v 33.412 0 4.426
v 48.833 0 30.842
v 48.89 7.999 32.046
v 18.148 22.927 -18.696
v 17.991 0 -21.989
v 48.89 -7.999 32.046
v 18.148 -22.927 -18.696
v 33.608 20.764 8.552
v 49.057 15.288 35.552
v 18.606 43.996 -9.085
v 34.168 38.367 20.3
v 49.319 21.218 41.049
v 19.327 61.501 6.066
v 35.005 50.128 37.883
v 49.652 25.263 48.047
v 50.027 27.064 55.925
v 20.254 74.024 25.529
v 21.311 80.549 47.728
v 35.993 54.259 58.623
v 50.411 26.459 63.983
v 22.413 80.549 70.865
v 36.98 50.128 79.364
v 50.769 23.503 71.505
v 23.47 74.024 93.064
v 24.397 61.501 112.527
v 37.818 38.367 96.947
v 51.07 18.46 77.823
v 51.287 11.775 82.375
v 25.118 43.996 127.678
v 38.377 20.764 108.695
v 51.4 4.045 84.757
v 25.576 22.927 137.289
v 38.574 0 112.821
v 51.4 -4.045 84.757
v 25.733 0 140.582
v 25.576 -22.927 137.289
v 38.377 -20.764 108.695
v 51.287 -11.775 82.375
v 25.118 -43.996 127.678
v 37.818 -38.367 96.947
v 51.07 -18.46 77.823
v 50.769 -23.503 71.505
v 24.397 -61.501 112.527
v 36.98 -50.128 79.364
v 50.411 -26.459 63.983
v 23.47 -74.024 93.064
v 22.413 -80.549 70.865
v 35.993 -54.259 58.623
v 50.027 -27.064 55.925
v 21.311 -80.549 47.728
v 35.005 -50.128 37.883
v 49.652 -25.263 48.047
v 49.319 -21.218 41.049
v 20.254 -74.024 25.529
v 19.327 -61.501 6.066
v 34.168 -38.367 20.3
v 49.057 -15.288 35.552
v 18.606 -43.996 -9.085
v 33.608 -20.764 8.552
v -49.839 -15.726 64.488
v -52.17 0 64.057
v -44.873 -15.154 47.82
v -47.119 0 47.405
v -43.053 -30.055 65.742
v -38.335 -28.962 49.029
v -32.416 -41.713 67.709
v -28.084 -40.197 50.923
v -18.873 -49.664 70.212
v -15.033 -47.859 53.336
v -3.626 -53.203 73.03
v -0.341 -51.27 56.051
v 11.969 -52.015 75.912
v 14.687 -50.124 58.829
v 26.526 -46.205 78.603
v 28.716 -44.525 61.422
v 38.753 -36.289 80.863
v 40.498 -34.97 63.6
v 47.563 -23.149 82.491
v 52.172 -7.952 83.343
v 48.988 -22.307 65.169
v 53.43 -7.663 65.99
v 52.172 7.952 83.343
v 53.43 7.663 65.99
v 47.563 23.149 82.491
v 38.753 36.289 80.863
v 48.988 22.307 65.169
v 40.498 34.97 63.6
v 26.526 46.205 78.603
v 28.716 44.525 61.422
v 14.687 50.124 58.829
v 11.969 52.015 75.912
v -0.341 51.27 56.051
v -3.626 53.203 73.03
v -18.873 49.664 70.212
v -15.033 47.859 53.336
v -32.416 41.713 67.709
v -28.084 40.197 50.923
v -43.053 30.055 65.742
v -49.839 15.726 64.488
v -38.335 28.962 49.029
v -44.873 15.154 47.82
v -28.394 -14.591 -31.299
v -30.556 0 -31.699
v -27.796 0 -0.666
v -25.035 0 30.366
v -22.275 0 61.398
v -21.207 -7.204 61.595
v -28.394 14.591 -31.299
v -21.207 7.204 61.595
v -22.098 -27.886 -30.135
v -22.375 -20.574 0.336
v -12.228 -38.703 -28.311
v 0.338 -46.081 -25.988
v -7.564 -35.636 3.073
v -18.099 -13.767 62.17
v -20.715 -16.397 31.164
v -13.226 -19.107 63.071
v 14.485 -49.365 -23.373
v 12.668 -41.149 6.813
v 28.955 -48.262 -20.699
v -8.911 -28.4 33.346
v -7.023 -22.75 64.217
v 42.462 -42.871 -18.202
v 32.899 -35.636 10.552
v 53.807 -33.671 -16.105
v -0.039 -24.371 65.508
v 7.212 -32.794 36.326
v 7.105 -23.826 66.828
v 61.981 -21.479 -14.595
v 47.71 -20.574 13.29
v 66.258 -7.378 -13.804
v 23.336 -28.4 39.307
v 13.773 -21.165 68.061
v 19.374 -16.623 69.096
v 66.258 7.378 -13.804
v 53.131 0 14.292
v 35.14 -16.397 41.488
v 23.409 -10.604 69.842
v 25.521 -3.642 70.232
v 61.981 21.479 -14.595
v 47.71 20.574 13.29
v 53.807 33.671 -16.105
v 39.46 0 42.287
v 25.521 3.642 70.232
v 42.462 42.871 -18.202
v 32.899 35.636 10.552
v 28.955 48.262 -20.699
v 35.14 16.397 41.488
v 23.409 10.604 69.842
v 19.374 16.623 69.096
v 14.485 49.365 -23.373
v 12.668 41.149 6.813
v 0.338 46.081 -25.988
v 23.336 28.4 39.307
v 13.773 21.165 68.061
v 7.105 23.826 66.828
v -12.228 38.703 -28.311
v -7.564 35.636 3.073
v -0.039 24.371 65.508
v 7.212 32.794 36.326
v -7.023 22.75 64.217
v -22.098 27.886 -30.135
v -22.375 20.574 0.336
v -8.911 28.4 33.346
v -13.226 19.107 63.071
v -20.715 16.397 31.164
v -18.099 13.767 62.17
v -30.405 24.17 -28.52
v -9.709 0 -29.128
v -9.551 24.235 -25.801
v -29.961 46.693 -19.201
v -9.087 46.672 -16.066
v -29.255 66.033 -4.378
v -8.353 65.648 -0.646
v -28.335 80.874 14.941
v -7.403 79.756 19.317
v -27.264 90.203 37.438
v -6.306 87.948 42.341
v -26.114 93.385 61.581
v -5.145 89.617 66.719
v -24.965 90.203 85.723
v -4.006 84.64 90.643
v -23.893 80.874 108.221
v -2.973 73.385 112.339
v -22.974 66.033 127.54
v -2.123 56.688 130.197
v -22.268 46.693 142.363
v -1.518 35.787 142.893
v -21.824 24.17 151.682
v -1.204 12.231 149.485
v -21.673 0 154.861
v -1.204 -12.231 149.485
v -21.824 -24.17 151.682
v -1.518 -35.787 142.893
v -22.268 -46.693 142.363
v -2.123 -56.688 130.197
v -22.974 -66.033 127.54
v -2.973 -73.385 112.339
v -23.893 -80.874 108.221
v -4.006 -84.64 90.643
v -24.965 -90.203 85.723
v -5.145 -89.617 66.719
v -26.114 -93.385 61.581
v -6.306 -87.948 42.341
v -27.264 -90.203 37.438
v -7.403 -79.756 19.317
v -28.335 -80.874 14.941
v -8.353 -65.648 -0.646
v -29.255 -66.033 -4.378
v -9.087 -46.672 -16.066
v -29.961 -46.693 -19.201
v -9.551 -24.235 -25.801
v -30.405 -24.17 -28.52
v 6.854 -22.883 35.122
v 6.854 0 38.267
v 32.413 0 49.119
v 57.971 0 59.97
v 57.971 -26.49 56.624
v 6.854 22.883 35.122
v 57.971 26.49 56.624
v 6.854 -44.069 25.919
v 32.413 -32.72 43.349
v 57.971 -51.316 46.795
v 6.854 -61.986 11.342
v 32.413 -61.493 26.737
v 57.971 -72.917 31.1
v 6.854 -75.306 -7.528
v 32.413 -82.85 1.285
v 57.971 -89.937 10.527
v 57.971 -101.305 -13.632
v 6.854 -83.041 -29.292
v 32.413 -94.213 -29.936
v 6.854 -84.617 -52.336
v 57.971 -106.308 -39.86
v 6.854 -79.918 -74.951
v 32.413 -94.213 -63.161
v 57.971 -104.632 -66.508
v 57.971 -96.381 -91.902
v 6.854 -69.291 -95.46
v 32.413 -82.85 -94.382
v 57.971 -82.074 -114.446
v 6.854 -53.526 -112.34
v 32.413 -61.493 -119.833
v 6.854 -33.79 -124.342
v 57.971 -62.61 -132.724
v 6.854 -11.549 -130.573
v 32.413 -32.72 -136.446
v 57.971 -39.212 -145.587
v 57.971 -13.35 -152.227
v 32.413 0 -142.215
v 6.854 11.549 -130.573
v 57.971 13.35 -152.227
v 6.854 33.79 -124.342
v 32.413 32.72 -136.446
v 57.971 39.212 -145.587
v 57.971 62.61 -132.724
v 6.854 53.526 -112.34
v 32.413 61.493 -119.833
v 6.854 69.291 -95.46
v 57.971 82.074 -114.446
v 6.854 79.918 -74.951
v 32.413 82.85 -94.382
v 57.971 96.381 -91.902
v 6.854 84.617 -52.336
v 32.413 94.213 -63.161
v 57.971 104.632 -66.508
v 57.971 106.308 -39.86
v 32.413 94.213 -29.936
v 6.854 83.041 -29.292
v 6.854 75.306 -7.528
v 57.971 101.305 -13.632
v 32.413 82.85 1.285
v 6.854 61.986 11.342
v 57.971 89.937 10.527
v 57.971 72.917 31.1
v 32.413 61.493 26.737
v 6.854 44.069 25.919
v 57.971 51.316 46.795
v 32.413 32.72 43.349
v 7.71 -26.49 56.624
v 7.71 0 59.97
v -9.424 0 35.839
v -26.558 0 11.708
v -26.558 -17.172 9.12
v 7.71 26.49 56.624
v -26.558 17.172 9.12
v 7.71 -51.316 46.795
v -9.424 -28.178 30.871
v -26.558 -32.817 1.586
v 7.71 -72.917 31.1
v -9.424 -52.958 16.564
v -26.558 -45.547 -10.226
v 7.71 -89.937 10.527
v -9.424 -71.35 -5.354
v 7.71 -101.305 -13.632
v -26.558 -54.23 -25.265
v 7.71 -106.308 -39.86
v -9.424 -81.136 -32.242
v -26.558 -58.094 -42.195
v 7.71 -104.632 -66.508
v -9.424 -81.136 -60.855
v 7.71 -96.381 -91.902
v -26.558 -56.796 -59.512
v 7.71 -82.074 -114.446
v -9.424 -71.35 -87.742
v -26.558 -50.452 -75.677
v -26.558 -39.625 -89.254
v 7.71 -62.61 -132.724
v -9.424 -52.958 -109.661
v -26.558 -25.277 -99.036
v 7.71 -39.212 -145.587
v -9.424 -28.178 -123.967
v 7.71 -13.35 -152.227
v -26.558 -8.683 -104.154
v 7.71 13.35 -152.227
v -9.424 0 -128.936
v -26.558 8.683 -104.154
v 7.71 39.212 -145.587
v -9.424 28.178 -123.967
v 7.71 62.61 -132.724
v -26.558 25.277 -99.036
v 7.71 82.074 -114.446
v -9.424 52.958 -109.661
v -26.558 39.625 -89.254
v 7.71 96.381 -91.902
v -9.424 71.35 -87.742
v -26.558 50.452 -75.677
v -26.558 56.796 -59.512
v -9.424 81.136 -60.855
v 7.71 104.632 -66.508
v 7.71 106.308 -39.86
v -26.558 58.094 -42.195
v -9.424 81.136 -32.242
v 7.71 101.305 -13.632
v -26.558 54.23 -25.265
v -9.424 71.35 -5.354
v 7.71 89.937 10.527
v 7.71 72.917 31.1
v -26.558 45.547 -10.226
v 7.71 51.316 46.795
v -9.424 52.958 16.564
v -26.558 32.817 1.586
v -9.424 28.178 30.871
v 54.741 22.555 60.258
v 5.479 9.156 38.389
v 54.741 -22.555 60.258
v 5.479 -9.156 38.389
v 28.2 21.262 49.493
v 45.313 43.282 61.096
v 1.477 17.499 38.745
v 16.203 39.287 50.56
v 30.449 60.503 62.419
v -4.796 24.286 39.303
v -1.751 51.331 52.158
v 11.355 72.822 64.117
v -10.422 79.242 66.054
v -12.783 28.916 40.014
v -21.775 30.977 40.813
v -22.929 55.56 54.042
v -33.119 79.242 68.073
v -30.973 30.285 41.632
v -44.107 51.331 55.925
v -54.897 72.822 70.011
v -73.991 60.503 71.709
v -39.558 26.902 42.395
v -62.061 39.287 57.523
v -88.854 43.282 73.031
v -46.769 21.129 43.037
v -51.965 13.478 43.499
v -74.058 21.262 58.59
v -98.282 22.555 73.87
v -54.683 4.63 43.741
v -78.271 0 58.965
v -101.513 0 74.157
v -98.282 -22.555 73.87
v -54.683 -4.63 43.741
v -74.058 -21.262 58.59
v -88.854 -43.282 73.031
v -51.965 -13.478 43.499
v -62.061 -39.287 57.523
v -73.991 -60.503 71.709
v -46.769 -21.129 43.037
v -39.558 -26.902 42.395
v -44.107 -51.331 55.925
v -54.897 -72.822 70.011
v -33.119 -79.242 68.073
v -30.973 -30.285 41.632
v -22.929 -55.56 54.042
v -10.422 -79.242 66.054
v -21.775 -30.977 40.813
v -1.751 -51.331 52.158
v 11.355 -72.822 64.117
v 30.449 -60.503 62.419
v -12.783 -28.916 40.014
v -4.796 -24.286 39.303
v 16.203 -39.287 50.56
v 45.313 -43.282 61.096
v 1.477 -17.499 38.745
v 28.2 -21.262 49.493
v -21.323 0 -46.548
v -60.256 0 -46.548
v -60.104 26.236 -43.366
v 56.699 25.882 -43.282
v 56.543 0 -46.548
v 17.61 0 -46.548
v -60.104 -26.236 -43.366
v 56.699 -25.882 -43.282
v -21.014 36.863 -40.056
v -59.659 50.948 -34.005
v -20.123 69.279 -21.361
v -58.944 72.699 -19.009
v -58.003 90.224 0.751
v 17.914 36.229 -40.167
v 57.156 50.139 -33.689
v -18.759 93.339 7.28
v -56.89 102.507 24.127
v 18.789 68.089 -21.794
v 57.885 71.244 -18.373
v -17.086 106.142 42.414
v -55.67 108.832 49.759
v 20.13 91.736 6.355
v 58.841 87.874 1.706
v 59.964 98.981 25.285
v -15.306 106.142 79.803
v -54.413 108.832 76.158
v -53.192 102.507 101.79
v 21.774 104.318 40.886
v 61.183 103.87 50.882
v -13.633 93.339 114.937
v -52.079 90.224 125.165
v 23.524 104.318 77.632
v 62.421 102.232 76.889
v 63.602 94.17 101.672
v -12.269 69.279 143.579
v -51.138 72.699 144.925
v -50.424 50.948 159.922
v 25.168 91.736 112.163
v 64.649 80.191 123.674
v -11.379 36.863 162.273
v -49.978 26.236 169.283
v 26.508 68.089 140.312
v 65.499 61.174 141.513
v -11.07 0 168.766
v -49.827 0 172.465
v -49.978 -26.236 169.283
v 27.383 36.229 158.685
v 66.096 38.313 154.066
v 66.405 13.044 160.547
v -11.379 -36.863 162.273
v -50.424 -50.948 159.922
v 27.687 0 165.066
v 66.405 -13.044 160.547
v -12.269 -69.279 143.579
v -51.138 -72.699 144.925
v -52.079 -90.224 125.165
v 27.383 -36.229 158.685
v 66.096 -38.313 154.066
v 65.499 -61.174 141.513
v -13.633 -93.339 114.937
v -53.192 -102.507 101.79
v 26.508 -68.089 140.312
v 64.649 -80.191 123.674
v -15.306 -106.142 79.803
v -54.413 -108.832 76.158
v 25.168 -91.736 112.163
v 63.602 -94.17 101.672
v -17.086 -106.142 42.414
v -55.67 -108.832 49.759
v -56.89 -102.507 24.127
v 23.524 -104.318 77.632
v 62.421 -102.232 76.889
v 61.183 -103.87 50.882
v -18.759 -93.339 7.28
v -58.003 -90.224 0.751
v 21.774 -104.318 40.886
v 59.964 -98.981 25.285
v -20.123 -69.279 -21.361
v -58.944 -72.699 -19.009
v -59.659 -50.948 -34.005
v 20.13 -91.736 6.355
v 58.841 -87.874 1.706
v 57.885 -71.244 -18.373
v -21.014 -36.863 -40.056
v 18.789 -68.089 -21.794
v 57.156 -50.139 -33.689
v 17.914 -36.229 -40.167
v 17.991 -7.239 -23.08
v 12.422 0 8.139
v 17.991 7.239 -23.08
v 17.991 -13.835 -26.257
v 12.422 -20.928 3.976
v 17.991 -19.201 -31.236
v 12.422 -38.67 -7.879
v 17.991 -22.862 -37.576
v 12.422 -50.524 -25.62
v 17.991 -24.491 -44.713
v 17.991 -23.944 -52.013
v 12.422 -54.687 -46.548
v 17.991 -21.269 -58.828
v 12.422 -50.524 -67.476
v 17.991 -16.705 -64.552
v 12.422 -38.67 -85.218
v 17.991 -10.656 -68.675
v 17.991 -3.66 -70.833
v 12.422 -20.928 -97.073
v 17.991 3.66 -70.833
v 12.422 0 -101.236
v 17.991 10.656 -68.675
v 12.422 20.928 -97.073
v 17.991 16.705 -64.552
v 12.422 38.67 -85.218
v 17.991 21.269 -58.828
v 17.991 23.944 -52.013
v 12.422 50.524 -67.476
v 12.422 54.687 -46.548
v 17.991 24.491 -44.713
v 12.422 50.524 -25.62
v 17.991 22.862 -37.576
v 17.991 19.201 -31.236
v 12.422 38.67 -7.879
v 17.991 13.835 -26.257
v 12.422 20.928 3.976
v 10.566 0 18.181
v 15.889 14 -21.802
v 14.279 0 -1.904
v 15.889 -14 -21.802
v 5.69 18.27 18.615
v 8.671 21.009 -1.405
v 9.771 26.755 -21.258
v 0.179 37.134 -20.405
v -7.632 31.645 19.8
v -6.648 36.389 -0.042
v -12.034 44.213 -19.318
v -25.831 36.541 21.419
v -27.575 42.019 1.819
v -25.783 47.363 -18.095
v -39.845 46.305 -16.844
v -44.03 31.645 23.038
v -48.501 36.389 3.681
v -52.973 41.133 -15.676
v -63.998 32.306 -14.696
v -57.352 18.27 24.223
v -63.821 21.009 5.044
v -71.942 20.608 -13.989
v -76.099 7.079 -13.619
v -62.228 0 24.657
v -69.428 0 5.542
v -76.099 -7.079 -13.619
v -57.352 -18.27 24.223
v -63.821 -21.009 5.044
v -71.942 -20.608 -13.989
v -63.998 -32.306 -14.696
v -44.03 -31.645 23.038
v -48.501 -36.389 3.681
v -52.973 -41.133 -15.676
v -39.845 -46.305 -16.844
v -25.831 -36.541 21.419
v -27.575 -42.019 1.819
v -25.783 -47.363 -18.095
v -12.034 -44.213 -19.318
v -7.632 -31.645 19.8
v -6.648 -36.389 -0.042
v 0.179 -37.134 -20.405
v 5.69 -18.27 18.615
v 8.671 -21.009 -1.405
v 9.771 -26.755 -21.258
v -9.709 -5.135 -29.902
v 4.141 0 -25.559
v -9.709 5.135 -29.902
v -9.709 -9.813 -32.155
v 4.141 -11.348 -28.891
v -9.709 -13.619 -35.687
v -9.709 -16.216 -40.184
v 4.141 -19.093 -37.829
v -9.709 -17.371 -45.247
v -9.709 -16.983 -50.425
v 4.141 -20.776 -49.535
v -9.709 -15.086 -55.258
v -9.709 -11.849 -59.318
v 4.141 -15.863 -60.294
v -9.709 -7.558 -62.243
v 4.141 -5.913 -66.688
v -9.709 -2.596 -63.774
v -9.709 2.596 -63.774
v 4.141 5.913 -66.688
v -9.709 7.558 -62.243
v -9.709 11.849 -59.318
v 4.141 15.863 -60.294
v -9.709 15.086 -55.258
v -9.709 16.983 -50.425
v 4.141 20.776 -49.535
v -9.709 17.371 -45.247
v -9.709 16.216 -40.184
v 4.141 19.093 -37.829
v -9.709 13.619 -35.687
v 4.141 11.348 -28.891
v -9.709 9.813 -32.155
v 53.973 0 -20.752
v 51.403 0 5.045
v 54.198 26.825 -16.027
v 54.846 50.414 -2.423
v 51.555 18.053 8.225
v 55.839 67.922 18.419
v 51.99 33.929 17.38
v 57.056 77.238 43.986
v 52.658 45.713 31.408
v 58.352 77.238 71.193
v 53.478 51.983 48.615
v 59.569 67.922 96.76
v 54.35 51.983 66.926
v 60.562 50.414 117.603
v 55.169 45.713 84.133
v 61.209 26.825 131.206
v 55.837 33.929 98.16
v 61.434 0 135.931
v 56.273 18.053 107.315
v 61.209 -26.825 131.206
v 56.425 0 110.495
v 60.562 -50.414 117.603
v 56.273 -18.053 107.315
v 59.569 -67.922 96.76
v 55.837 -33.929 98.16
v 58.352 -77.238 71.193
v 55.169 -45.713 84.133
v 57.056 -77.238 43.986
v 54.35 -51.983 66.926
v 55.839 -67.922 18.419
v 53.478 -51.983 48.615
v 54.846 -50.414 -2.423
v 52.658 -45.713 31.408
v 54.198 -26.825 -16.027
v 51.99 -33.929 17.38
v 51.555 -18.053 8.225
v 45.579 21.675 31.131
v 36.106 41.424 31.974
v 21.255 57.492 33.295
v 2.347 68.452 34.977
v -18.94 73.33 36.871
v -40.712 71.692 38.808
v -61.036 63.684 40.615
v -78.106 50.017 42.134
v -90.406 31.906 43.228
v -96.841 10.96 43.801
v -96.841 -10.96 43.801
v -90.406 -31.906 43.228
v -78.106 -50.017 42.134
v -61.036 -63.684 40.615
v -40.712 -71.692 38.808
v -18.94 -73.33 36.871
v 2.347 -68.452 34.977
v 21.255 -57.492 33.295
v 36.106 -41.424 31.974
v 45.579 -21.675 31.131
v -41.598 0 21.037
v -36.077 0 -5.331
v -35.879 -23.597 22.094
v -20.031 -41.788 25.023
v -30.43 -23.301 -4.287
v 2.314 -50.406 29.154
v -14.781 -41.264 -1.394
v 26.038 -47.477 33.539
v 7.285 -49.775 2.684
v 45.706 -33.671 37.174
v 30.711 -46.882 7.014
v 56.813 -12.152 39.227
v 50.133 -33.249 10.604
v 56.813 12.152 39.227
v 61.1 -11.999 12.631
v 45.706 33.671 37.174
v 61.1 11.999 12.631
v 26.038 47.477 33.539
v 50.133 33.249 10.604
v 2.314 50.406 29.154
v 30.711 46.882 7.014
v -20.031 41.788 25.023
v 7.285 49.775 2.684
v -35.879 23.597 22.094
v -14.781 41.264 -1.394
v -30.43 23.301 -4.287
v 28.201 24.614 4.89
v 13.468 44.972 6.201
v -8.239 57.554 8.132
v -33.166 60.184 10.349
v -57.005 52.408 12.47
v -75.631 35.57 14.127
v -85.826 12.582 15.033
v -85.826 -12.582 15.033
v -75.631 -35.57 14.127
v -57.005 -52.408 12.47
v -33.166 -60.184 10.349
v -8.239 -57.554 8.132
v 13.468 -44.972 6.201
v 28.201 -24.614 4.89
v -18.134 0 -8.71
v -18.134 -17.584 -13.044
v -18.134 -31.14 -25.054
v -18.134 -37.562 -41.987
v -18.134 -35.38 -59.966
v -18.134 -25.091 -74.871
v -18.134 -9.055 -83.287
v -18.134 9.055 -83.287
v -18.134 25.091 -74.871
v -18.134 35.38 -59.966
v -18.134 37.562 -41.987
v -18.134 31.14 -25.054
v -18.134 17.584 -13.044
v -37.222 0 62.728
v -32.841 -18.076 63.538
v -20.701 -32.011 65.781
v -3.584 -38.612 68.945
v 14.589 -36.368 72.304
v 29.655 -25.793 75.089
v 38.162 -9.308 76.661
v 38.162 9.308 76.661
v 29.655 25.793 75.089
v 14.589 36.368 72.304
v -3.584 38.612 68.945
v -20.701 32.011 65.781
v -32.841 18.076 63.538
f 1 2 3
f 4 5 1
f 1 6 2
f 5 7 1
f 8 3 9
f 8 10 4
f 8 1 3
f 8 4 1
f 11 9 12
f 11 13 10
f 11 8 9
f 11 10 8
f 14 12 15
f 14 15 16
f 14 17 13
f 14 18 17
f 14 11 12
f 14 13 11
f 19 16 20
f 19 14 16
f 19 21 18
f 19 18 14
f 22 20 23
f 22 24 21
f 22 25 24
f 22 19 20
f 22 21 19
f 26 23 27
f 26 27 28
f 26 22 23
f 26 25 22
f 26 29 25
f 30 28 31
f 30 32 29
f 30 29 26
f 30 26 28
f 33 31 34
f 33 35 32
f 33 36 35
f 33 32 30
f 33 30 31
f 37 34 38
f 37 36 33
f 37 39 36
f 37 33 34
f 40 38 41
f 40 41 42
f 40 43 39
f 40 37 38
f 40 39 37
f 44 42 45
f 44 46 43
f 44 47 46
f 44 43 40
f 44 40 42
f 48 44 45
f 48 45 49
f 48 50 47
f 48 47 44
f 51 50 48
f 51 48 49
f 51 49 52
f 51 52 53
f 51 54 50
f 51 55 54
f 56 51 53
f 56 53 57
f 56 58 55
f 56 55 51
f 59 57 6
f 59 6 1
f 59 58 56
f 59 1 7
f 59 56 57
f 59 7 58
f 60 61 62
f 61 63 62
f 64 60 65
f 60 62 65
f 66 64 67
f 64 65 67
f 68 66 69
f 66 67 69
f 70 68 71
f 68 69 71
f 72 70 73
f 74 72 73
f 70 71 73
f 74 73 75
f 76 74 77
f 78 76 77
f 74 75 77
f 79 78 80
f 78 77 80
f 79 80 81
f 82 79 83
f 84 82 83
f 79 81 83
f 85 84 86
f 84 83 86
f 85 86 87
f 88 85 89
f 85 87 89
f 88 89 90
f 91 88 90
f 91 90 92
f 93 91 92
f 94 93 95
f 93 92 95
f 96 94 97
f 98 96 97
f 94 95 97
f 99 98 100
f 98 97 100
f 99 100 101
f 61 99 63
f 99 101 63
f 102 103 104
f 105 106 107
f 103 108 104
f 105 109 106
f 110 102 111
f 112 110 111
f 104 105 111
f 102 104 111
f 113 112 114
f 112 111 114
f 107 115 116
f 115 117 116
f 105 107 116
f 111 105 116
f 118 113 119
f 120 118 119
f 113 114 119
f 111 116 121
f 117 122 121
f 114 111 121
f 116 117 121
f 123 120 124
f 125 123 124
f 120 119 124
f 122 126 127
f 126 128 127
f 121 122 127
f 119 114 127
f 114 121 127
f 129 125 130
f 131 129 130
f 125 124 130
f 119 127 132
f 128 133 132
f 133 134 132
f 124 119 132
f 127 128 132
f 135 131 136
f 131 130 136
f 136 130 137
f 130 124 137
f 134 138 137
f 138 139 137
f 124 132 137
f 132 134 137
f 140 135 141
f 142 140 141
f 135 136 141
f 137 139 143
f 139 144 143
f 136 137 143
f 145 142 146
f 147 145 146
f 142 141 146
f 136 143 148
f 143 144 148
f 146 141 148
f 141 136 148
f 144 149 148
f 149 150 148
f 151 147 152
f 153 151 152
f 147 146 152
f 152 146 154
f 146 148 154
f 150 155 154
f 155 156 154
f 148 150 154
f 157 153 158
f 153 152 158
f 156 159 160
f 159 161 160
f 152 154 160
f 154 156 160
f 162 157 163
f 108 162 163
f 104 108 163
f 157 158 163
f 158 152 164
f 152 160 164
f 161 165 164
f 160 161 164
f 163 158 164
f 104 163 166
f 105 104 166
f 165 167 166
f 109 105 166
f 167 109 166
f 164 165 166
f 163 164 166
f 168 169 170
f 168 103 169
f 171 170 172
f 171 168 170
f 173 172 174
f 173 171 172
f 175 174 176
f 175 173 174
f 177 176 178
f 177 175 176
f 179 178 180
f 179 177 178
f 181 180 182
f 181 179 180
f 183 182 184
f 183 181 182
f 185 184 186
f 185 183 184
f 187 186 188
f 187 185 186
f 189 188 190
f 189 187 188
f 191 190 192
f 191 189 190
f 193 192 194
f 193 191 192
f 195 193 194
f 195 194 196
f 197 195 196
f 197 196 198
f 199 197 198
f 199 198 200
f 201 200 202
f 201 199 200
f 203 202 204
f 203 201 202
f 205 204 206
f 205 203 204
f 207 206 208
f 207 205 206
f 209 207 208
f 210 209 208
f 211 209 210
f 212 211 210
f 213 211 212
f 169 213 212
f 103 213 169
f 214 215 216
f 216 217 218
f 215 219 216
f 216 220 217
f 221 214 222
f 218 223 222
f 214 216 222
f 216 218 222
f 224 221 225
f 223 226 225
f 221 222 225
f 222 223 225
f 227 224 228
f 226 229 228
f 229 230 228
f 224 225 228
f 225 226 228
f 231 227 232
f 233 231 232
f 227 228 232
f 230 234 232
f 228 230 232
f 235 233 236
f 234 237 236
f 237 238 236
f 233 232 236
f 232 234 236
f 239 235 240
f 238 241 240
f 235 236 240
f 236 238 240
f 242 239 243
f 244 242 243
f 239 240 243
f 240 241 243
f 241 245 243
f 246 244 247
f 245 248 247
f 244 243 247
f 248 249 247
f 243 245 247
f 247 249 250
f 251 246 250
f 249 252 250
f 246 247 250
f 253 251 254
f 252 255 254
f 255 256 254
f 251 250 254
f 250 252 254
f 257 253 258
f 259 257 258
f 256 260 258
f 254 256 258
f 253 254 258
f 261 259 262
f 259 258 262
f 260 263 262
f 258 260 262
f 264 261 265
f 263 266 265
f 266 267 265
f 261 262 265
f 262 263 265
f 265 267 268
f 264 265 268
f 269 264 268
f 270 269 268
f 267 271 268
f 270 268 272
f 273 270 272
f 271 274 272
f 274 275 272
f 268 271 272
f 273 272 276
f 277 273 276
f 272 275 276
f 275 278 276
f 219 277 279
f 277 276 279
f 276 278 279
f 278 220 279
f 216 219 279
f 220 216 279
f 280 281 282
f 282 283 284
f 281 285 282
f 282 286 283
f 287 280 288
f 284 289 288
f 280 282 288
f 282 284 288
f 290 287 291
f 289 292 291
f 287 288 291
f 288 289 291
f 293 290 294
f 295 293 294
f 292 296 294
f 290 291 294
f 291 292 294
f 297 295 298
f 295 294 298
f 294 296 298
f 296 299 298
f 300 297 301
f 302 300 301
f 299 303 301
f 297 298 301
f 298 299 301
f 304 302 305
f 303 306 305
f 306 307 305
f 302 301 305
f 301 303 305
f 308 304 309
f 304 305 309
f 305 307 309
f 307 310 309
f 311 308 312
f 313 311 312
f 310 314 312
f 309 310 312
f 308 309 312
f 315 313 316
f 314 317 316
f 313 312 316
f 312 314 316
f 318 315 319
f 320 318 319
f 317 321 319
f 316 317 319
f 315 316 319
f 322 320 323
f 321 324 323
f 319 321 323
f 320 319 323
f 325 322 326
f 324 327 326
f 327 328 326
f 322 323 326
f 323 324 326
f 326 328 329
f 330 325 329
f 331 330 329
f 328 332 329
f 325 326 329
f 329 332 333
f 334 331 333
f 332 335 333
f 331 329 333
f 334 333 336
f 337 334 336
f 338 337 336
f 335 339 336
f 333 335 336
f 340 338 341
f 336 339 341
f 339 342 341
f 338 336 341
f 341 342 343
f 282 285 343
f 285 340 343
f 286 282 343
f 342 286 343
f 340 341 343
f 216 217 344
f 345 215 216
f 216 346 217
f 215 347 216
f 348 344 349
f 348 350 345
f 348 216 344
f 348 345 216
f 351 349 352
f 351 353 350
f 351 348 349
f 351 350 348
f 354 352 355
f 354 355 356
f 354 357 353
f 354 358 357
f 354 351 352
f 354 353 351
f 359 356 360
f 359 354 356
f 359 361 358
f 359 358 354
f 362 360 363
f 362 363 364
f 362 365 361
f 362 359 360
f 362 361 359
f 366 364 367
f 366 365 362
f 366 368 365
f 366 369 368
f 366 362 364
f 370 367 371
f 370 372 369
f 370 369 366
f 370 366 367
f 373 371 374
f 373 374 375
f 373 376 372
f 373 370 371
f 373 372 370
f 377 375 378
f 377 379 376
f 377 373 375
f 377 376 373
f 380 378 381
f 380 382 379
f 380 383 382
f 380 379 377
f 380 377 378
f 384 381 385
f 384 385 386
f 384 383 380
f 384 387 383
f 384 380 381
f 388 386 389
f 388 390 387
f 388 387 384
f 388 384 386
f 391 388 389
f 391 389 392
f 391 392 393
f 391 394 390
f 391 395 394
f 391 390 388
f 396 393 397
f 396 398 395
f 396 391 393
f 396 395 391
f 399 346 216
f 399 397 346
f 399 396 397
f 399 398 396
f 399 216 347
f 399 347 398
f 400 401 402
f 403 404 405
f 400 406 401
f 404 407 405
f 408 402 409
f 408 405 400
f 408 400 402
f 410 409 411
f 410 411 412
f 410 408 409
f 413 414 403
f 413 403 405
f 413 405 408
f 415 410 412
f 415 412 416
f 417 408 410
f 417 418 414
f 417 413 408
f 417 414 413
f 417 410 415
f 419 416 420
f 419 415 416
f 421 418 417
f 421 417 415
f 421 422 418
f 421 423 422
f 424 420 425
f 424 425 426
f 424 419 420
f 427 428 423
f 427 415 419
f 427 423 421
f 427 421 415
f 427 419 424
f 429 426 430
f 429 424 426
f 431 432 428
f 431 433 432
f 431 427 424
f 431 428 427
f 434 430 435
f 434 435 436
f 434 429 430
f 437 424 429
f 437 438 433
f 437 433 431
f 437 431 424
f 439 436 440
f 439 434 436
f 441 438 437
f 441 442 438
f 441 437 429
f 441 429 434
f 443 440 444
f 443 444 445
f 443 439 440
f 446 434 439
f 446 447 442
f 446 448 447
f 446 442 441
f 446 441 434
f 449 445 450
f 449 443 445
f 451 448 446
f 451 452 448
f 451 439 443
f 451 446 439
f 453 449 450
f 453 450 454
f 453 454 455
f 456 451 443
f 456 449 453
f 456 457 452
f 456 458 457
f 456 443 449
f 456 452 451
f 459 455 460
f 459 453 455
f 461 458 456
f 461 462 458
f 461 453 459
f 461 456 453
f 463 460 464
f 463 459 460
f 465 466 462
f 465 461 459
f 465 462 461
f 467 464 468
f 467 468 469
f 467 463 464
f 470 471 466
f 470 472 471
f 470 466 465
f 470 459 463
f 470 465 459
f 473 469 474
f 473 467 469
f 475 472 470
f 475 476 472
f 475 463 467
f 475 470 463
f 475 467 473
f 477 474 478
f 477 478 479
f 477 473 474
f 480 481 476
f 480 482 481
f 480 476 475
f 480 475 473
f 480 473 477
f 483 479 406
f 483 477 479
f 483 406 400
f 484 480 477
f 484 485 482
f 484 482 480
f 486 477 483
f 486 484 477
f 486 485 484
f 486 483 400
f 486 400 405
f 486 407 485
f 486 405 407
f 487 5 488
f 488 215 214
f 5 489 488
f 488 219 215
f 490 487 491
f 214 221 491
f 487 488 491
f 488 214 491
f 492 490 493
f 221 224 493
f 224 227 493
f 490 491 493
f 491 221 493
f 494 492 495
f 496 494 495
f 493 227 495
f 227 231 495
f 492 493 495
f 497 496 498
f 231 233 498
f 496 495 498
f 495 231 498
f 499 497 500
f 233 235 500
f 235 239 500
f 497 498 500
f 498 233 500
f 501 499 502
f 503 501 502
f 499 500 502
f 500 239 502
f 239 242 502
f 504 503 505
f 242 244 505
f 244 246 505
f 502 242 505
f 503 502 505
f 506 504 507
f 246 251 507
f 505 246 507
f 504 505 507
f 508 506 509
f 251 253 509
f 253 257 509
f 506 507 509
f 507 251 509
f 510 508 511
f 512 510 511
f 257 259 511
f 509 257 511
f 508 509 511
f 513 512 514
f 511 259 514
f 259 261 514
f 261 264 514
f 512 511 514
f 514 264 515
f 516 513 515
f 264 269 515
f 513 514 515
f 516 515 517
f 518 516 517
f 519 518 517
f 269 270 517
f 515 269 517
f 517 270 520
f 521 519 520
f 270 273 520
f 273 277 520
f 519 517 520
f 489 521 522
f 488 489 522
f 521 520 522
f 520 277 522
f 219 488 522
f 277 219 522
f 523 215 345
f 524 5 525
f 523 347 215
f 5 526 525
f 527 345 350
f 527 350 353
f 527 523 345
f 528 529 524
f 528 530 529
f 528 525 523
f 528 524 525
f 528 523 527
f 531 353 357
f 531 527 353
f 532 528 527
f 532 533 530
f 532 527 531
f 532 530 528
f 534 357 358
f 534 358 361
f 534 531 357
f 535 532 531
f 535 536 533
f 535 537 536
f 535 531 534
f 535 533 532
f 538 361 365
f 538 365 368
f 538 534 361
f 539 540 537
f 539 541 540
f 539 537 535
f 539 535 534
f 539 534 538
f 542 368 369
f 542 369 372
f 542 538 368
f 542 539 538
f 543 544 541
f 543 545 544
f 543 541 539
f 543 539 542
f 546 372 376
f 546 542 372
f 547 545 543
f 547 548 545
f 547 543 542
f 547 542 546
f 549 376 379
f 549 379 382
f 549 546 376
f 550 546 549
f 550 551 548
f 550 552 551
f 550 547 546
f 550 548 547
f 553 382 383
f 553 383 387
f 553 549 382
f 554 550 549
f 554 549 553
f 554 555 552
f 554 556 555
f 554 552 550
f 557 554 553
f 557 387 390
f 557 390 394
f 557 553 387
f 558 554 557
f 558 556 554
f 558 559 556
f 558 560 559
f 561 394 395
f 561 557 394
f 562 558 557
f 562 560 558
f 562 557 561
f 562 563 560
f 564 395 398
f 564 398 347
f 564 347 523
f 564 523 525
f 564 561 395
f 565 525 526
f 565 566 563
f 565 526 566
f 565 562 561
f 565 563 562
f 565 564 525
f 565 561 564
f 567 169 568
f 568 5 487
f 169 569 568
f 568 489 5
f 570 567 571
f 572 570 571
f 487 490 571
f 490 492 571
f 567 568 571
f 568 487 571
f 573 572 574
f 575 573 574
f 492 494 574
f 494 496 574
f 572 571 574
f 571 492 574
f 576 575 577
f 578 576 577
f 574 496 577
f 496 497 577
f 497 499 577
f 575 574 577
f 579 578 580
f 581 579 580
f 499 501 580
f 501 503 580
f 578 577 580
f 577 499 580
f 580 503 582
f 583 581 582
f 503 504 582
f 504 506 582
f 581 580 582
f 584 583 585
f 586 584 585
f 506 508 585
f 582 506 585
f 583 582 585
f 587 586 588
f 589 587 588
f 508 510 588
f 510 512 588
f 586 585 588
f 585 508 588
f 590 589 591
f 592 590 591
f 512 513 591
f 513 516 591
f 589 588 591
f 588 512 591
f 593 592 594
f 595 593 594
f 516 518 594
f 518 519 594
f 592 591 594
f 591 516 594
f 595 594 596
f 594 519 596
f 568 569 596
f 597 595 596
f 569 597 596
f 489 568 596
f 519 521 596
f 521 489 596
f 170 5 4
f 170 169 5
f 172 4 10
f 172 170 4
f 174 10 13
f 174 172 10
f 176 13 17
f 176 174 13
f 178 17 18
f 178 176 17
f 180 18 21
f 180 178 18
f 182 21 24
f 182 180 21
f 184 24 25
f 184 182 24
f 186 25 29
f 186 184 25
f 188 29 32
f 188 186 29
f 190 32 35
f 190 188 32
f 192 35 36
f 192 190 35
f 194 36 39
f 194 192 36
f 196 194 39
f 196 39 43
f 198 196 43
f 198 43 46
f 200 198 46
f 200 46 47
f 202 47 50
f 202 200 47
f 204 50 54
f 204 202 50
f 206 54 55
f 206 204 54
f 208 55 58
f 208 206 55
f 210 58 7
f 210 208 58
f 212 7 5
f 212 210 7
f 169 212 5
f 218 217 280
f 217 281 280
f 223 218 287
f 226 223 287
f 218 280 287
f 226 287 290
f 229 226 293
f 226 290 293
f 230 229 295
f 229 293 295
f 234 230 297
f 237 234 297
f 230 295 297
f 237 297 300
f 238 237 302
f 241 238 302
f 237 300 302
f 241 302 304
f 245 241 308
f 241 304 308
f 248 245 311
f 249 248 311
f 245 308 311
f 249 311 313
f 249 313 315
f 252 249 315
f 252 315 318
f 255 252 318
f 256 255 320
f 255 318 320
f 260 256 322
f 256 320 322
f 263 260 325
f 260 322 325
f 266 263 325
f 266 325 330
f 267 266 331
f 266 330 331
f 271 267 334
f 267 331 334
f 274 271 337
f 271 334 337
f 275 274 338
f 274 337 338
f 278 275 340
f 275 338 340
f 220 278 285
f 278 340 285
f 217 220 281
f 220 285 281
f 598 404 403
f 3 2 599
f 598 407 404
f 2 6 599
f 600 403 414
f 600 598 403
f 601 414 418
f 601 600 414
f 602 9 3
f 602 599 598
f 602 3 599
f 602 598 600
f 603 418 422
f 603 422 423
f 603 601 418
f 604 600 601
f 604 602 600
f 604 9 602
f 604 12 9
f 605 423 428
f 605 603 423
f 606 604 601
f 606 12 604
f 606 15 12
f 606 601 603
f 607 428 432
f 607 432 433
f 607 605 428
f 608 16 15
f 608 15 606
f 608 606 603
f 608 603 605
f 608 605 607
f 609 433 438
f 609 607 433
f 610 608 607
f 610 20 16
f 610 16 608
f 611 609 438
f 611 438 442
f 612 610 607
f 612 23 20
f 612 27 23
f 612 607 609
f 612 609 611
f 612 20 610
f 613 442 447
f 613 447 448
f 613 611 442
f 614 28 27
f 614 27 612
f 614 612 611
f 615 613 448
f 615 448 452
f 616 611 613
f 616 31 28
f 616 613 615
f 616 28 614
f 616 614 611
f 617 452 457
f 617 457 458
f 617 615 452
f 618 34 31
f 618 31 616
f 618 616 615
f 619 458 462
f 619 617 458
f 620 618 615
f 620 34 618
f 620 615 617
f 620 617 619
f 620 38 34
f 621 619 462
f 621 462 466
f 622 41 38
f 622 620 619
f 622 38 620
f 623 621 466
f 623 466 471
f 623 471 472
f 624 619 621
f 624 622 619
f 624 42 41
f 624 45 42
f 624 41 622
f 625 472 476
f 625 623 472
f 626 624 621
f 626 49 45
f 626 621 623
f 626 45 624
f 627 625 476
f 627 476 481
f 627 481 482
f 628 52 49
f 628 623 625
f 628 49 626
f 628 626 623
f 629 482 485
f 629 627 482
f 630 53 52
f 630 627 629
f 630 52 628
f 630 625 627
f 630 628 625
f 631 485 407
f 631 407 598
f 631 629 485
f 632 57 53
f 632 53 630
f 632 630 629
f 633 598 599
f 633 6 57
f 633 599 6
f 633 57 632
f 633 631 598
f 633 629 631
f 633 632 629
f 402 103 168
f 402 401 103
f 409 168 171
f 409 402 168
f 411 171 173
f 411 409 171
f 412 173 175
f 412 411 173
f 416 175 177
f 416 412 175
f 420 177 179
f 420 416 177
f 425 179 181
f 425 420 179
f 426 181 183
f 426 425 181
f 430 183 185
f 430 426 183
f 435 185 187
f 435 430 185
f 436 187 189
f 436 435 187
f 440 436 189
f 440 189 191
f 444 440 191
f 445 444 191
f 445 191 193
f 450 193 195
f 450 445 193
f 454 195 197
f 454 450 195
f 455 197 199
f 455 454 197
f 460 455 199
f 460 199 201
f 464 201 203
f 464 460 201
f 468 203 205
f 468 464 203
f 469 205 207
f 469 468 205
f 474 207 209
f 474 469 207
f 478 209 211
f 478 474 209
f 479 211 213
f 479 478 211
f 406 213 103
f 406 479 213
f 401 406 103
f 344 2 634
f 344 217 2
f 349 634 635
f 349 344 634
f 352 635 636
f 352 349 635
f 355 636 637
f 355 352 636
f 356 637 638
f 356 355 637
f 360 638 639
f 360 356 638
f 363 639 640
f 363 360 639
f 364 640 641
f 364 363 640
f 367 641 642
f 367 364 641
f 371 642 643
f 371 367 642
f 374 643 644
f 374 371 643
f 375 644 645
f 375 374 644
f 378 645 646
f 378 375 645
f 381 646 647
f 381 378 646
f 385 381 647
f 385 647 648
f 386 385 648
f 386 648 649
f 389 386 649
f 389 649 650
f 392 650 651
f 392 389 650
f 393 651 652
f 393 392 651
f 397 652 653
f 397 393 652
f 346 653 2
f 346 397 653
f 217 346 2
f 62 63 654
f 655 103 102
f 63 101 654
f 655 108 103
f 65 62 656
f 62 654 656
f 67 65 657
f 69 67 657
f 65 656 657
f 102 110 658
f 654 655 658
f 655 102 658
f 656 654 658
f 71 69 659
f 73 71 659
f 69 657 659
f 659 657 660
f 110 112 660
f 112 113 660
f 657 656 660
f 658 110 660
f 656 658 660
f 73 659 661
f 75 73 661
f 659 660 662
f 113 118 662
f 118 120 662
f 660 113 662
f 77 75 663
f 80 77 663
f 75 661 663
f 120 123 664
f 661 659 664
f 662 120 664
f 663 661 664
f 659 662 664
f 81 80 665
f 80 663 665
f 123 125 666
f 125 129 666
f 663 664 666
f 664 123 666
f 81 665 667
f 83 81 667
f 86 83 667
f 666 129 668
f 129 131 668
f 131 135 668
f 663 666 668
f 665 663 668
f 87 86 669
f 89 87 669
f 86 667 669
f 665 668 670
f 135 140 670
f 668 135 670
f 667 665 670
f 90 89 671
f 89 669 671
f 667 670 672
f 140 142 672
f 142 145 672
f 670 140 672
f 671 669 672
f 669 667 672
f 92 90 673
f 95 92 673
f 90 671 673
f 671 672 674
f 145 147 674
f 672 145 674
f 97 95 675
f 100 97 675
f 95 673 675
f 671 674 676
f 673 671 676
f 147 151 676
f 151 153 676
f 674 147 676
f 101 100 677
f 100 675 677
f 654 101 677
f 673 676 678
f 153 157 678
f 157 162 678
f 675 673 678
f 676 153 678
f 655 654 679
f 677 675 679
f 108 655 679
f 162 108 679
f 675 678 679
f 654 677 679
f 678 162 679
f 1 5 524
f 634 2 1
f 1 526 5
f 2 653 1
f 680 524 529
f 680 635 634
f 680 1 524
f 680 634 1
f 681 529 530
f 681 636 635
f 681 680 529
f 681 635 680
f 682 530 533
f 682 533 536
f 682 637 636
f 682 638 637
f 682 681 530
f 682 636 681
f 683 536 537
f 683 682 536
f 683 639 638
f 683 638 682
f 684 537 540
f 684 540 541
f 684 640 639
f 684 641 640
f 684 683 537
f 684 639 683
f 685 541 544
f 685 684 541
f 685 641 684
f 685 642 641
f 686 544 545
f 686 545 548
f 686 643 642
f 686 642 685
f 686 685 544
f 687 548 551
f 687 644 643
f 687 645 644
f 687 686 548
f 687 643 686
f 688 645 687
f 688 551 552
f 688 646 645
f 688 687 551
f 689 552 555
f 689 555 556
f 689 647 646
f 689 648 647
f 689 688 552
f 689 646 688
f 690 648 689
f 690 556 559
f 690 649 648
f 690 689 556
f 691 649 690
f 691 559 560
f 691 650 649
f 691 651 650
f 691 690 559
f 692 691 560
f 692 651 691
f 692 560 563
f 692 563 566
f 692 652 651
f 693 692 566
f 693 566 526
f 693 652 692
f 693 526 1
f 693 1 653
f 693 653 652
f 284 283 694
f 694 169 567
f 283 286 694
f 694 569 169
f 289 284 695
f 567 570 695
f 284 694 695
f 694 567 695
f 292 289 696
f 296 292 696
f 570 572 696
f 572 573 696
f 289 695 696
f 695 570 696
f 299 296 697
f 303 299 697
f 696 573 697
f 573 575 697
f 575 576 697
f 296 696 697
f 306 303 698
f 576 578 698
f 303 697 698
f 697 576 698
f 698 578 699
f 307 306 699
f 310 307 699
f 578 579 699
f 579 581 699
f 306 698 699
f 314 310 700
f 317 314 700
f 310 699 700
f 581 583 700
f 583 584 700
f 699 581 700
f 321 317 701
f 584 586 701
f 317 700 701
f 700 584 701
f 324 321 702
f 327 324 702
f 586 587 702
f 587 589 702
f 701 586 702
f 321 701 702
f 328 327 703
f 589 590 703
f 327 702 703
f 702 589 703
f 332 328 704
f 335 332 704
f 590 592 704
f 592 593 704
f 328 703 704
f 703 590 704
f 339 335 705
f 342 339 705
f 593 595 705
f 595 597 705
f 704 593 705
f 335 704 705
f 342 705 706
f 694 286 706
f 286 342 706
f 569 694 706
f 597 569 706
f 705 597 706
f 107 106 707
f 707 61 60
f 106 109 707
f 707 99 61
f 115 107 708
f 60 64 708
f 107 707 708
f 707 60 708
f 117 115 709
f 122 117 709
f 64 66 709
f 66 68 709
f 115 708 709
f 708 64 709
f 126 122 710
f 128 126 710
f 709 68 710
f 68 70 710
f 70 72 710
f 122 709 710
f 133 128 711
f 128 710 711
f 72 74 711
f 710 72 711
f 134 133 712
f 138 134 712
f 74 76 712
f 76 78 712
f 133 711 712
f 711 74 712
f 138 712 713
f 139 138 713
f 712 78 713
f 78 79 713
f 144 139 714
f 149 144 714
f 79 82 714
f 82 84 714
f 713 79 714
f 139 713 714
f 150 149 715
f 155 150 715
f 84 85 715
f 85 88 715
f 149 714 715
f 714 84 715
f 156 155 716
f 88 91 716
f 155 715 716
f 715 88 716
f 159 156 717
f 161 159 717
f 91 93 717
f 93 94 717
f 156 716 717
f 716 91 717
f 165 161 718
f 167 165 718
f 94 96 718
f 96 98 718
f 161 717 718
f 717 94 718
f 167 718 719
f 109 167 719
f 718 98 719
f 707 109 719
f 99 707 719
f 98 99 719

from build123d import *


with BuildPart() as f1:
    # F0 (on Front) → F1 (revolve)
    with BuildSketch(Plane.XZ):
        Polygon((-52.169516676, 64.0574839801), (-47.119487077, 47.4050678313), (-30.5562727153, -31.6985659301), (-22.2746655345, 61.3981261849), align=None)
    revolve(axis=Axis((12.4224144965, 0, 8.1388242543), (-0.1817555197, 0, 0.9833437502)))


with BuildPart() as f2:
    # F0 (on Front) → F2 (revolve)
    with BuildSketch(Plane.XZ):
        Polygon((-26.5582557768, 11.7084821686), (-9.7094671801, -29.1284099221), (17.9910827428, -21.9890922308), (6.8537462503, 38.2667407393), (57.9712577164, 59.9702633917), (7.7104633674, 59.9702633917), align=None)
    revolve(axis=Axis((-1.8562190235, 0, -46.5483441949), (1, 0, 0)))


with BuildPart() as f3:
    # F0 (on Front) → F3 (revolve)
    with BuildSketch(Plane.XZ):
        Polygon((-30.5562727153, -31.6985659301), (-60.2558329701, -46.5483441949), (56.5433949232, -46.5483441949), (48.8329343498, 30.841851607), (17.9910827428, -21.9890922308), (-9.7094671801, -29.1284099221), align=None)
    revolve(axis=Axis((-7.2821010835, 0, 60.6841947883), (0.9988681385, 0, -0.0475651332)))


with BuildPart() as f4:
    # F0 (on Front) → F4 (revolve)
    with BuildSketch(Plane.XZ):
        Polygon((17.9910827428, -21.9890922308), (48.8329343498, 30.841851607), (57.9712577164, 59.9702633917), (6.8537462503, 38.2667407393), align=None)
    revolve(axis=Axis((-26.4154691249, 0, 14.8497801274), (0.0886071518, 0, 0.9960666507)))


solid = Compound([f1.part, f2.part, f3.part, f4.part])
